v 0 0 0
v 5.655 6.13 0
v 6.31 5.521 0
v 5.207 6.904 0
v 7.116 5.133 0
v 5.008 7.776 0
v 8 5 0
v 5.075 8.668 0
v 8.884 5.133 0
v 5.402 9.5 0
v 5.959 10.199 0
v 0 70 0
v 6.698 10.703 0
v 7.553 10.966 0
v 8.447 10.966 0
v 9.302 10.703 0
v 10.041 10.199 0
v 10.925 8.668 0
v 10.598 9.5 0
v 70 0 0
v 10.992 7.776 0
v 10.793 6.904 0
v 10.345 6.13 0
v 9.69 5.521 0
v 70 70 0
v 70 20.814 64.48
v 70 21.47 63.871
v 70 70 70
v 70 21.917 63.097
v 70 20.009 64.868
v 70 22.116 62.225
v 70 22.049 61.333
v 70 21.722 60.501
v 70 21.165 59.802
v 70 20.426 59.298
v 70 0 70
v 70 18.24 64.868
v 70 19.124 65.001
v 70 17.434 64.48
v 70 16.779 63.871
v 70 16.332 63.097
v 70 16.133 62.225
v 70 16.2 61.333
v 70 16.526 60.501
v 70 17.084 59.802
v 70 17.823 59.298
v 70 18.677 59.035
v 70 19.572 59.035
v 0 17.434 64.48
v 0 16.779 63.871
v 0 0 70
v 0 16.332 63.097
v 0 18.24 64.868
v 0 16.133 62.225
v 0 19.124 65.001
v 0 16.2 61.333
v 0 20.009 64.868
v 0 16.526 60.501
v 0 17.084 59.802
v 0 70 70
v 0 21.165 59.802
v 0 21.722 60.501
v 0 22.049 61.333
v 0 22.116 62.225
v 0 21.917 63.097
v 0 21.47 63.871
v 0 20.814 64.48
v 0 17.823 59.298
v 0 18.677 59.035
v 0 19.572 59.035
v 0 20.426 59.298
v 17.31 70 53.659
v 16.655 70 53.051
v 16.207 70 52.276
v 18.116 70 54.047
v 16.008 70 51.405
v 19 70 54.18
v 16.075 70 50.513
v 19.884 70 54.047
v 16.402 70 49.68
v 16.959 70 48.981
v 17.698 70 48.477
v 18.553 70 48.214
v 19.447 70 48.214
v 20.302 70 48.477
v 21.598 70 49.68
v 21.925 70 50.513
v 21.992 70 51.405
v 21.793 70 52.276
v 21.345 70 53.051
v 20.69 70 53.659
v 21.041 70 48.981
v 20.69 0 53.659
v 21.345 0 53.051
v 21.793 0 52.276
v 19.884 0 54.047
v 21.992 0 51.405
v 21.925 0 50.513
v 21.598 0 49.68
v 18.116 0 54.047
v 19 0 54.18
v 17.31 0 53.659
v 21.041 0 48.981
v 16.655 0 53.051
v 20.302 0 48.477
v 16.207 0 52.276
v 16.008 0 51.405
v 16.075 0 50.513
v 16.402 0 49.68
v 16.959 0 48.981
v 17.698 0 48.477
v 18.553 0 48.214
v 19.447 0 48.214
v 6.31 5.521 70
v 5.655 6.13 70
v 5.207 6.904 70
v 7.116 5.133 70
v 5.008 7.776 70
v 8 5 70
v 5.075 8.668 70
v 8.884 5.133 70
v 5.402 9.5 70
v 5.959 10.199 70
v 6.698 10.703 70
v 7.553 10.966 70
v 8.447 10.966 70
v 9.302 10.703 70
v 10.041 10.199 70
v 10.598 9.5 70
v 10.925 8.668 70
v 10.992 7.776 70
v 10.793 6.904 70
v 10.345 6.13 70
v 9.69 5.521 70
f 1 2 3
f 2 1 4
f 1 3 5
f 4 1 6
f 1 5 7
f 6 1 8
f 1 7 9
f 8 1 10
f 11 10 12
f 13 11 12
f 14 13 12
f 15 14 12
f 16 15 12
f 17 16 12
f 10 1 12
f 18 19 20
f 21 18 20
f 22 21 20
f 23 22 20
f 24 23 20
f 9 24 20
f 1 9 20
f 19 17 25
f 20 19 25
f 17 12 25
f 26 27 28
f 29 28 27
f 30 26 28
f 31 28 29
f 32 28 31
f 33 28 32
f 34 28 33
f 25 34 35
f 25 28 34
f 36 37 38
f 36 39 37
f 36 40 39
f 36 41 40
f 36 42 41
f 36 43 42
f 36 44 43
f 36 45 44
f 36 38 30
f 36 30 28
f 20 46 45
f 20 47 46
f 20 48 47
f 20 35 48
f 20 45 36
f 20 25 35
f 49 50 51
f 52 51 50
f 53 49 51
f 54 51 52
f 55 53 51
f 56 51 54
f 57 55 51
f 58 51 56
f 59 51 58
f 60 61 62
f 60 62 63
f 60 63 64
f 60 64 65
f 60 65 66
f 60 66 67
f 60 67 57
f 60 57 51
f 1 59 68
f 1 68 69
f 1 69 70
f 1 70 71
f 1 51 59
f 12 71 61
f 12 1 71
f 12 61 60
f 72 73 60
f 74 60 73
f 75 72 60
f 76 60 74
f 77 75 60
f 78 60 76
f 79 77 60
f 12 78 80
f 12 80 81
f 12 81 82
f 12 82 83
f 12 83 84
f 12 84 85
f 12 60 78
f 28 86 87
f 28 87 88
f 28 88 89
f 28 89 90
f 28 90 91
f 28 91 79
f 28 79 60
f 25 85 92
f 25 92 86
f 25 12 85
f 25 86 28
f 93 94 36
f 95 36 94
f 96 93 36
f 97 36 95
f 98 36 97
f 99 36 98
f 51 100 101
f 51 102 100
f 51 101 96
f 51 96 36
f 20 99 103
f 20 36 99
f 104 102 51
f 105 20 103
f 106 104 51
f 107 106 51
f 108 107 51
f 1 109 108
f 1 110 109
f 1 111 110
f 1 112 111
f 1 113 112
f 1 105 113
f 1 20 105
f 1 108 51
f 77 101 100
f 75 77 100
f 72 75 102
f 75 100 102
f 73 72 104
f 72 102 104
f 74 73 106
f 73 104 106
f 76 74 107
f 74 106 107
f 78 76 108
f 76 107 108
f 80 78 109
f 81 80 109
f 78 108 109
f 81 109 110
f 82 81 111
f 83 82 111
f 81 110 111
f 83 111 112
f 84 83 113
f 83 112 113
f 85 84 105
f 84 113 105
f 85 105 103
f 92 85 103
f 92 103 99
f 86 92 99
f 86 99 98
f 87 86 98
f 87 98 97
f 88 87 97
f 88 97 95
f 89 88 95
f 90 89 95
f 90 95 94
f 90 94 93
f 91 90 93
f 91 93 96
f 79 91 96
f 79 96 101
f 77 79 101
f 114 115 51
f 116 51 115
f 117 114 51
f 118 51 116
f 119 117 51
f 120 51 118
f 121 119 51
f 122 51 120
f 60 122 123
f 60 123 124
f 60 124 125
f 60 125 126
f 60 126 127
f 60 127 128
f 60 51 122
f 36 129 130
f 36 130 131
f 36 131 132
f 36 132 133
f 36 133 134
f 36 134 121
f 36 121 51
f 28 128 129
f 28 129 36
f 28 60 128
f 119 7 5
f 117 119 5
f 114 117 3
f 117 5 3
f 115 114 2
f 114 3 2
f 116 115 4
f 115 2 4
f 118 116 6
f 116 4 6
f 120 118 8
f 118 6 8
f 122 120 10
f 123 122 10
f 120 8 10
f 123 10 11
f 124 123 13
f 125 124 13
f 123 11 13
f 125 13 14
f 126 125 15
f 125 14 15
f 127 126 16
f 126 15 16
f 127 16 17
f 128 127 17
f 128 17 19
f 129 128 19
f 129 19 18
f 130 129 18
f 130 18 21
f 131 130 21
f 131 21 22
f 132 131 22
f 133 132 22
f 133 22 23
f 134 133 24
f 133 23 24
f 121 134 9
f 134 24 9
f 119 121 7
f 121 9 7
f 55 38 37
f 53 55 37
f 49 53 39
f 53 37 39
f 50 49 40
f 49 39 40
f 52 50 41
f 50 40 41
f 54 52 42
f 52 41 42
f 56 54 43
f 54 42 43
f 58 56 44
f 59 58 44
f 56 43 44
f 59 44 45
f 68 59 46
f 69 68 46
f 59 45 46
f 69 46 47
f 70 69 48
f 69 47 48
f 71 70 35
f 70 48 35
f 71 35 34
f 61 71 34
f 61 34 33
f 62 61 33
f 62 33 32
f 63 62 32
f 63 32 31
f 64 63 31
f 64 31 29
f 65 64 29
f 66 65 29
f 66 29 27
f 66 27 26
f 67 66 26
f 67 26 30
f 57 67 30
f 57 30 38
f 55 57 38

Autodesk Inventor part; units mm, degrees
ref_plane "YZ Plane" through (0, 0, 0) normal (1, 0, 0) x (0, 1, 0)
ref_plane "XZ Plane" through (0, 0, 0) normal (0, 1, 0) x (-1, 0, 0)
ref_plane "XY Plane" through (0, 0, 0) normal (0, 0, 1) x (1, 0, 0)
sketch "Sketch1" plane through (0, 0, 0) normal (0, 0, 1) x (1, 0, 0)
  line L0 (0, 0) -> (0, 70)
  line L1 (0, 70) -> (70, 70)
  line L2 (70, 70) -> (70, 0)
  line L3 (70, 0) -> (0, 0)
  dimension "d0" = 70
  dimension "d1" = 70
extrude "Extrusion1" add sketch "Sketch1" along normal blind 70
sketch "Sketch2" plane through (0, 0, 70) normal (0, 0, 1) x (1, 0, 0)
  circle A0 centre (8, 8) radius 3
  dimension "d6" = 6
hole "Hole1" at (8, 8, 70) direction (0, 0, -1) diameter 6 end through all
sketch "Sketch3" plane through (0, 0, 0) normal (-1, 0, 0) x (0, 0, 1)
  line L0 (69.699, 0) -> (70, 18.9976)
  line L1 (70, 70) -> (70, 0) projected
  line L2 (70, 18.9976) -> (62.001, 19.1244)
  circle A0 centre (62.001, 19.1244) radius 3
  point P0 (0, 0)
  dimension "d14" = 19
  dimension "d15" = 8
  dimension "d16" = 6
hole "Hole2" at (0, 19.1244, 62.001) direction (1, 0, 0) diameter 6 end through all
sketch "Sketch4" plane through (0, 70, 0) normal (0, 1, 0) x (1, 0, 0)
  line L0 (0, -70.1804) -> (0, -51.1804)
  line L1 (0, 0) -> (0, -70) projected
  line L2 (0, -51.1804) -> (19, -51.1804)
  circle A0 centre (19, -51.1804) radius 3
  dimension "d24" = 19
  dimension "d25" = 19
  dimension "d26" = 6
hole "Hole3" at (19, 70, 51.1804) direction (0, -1, 0) diameter 6 end through all
properties part number "Bundhjørne1" material "PC/ABS Plastic"
